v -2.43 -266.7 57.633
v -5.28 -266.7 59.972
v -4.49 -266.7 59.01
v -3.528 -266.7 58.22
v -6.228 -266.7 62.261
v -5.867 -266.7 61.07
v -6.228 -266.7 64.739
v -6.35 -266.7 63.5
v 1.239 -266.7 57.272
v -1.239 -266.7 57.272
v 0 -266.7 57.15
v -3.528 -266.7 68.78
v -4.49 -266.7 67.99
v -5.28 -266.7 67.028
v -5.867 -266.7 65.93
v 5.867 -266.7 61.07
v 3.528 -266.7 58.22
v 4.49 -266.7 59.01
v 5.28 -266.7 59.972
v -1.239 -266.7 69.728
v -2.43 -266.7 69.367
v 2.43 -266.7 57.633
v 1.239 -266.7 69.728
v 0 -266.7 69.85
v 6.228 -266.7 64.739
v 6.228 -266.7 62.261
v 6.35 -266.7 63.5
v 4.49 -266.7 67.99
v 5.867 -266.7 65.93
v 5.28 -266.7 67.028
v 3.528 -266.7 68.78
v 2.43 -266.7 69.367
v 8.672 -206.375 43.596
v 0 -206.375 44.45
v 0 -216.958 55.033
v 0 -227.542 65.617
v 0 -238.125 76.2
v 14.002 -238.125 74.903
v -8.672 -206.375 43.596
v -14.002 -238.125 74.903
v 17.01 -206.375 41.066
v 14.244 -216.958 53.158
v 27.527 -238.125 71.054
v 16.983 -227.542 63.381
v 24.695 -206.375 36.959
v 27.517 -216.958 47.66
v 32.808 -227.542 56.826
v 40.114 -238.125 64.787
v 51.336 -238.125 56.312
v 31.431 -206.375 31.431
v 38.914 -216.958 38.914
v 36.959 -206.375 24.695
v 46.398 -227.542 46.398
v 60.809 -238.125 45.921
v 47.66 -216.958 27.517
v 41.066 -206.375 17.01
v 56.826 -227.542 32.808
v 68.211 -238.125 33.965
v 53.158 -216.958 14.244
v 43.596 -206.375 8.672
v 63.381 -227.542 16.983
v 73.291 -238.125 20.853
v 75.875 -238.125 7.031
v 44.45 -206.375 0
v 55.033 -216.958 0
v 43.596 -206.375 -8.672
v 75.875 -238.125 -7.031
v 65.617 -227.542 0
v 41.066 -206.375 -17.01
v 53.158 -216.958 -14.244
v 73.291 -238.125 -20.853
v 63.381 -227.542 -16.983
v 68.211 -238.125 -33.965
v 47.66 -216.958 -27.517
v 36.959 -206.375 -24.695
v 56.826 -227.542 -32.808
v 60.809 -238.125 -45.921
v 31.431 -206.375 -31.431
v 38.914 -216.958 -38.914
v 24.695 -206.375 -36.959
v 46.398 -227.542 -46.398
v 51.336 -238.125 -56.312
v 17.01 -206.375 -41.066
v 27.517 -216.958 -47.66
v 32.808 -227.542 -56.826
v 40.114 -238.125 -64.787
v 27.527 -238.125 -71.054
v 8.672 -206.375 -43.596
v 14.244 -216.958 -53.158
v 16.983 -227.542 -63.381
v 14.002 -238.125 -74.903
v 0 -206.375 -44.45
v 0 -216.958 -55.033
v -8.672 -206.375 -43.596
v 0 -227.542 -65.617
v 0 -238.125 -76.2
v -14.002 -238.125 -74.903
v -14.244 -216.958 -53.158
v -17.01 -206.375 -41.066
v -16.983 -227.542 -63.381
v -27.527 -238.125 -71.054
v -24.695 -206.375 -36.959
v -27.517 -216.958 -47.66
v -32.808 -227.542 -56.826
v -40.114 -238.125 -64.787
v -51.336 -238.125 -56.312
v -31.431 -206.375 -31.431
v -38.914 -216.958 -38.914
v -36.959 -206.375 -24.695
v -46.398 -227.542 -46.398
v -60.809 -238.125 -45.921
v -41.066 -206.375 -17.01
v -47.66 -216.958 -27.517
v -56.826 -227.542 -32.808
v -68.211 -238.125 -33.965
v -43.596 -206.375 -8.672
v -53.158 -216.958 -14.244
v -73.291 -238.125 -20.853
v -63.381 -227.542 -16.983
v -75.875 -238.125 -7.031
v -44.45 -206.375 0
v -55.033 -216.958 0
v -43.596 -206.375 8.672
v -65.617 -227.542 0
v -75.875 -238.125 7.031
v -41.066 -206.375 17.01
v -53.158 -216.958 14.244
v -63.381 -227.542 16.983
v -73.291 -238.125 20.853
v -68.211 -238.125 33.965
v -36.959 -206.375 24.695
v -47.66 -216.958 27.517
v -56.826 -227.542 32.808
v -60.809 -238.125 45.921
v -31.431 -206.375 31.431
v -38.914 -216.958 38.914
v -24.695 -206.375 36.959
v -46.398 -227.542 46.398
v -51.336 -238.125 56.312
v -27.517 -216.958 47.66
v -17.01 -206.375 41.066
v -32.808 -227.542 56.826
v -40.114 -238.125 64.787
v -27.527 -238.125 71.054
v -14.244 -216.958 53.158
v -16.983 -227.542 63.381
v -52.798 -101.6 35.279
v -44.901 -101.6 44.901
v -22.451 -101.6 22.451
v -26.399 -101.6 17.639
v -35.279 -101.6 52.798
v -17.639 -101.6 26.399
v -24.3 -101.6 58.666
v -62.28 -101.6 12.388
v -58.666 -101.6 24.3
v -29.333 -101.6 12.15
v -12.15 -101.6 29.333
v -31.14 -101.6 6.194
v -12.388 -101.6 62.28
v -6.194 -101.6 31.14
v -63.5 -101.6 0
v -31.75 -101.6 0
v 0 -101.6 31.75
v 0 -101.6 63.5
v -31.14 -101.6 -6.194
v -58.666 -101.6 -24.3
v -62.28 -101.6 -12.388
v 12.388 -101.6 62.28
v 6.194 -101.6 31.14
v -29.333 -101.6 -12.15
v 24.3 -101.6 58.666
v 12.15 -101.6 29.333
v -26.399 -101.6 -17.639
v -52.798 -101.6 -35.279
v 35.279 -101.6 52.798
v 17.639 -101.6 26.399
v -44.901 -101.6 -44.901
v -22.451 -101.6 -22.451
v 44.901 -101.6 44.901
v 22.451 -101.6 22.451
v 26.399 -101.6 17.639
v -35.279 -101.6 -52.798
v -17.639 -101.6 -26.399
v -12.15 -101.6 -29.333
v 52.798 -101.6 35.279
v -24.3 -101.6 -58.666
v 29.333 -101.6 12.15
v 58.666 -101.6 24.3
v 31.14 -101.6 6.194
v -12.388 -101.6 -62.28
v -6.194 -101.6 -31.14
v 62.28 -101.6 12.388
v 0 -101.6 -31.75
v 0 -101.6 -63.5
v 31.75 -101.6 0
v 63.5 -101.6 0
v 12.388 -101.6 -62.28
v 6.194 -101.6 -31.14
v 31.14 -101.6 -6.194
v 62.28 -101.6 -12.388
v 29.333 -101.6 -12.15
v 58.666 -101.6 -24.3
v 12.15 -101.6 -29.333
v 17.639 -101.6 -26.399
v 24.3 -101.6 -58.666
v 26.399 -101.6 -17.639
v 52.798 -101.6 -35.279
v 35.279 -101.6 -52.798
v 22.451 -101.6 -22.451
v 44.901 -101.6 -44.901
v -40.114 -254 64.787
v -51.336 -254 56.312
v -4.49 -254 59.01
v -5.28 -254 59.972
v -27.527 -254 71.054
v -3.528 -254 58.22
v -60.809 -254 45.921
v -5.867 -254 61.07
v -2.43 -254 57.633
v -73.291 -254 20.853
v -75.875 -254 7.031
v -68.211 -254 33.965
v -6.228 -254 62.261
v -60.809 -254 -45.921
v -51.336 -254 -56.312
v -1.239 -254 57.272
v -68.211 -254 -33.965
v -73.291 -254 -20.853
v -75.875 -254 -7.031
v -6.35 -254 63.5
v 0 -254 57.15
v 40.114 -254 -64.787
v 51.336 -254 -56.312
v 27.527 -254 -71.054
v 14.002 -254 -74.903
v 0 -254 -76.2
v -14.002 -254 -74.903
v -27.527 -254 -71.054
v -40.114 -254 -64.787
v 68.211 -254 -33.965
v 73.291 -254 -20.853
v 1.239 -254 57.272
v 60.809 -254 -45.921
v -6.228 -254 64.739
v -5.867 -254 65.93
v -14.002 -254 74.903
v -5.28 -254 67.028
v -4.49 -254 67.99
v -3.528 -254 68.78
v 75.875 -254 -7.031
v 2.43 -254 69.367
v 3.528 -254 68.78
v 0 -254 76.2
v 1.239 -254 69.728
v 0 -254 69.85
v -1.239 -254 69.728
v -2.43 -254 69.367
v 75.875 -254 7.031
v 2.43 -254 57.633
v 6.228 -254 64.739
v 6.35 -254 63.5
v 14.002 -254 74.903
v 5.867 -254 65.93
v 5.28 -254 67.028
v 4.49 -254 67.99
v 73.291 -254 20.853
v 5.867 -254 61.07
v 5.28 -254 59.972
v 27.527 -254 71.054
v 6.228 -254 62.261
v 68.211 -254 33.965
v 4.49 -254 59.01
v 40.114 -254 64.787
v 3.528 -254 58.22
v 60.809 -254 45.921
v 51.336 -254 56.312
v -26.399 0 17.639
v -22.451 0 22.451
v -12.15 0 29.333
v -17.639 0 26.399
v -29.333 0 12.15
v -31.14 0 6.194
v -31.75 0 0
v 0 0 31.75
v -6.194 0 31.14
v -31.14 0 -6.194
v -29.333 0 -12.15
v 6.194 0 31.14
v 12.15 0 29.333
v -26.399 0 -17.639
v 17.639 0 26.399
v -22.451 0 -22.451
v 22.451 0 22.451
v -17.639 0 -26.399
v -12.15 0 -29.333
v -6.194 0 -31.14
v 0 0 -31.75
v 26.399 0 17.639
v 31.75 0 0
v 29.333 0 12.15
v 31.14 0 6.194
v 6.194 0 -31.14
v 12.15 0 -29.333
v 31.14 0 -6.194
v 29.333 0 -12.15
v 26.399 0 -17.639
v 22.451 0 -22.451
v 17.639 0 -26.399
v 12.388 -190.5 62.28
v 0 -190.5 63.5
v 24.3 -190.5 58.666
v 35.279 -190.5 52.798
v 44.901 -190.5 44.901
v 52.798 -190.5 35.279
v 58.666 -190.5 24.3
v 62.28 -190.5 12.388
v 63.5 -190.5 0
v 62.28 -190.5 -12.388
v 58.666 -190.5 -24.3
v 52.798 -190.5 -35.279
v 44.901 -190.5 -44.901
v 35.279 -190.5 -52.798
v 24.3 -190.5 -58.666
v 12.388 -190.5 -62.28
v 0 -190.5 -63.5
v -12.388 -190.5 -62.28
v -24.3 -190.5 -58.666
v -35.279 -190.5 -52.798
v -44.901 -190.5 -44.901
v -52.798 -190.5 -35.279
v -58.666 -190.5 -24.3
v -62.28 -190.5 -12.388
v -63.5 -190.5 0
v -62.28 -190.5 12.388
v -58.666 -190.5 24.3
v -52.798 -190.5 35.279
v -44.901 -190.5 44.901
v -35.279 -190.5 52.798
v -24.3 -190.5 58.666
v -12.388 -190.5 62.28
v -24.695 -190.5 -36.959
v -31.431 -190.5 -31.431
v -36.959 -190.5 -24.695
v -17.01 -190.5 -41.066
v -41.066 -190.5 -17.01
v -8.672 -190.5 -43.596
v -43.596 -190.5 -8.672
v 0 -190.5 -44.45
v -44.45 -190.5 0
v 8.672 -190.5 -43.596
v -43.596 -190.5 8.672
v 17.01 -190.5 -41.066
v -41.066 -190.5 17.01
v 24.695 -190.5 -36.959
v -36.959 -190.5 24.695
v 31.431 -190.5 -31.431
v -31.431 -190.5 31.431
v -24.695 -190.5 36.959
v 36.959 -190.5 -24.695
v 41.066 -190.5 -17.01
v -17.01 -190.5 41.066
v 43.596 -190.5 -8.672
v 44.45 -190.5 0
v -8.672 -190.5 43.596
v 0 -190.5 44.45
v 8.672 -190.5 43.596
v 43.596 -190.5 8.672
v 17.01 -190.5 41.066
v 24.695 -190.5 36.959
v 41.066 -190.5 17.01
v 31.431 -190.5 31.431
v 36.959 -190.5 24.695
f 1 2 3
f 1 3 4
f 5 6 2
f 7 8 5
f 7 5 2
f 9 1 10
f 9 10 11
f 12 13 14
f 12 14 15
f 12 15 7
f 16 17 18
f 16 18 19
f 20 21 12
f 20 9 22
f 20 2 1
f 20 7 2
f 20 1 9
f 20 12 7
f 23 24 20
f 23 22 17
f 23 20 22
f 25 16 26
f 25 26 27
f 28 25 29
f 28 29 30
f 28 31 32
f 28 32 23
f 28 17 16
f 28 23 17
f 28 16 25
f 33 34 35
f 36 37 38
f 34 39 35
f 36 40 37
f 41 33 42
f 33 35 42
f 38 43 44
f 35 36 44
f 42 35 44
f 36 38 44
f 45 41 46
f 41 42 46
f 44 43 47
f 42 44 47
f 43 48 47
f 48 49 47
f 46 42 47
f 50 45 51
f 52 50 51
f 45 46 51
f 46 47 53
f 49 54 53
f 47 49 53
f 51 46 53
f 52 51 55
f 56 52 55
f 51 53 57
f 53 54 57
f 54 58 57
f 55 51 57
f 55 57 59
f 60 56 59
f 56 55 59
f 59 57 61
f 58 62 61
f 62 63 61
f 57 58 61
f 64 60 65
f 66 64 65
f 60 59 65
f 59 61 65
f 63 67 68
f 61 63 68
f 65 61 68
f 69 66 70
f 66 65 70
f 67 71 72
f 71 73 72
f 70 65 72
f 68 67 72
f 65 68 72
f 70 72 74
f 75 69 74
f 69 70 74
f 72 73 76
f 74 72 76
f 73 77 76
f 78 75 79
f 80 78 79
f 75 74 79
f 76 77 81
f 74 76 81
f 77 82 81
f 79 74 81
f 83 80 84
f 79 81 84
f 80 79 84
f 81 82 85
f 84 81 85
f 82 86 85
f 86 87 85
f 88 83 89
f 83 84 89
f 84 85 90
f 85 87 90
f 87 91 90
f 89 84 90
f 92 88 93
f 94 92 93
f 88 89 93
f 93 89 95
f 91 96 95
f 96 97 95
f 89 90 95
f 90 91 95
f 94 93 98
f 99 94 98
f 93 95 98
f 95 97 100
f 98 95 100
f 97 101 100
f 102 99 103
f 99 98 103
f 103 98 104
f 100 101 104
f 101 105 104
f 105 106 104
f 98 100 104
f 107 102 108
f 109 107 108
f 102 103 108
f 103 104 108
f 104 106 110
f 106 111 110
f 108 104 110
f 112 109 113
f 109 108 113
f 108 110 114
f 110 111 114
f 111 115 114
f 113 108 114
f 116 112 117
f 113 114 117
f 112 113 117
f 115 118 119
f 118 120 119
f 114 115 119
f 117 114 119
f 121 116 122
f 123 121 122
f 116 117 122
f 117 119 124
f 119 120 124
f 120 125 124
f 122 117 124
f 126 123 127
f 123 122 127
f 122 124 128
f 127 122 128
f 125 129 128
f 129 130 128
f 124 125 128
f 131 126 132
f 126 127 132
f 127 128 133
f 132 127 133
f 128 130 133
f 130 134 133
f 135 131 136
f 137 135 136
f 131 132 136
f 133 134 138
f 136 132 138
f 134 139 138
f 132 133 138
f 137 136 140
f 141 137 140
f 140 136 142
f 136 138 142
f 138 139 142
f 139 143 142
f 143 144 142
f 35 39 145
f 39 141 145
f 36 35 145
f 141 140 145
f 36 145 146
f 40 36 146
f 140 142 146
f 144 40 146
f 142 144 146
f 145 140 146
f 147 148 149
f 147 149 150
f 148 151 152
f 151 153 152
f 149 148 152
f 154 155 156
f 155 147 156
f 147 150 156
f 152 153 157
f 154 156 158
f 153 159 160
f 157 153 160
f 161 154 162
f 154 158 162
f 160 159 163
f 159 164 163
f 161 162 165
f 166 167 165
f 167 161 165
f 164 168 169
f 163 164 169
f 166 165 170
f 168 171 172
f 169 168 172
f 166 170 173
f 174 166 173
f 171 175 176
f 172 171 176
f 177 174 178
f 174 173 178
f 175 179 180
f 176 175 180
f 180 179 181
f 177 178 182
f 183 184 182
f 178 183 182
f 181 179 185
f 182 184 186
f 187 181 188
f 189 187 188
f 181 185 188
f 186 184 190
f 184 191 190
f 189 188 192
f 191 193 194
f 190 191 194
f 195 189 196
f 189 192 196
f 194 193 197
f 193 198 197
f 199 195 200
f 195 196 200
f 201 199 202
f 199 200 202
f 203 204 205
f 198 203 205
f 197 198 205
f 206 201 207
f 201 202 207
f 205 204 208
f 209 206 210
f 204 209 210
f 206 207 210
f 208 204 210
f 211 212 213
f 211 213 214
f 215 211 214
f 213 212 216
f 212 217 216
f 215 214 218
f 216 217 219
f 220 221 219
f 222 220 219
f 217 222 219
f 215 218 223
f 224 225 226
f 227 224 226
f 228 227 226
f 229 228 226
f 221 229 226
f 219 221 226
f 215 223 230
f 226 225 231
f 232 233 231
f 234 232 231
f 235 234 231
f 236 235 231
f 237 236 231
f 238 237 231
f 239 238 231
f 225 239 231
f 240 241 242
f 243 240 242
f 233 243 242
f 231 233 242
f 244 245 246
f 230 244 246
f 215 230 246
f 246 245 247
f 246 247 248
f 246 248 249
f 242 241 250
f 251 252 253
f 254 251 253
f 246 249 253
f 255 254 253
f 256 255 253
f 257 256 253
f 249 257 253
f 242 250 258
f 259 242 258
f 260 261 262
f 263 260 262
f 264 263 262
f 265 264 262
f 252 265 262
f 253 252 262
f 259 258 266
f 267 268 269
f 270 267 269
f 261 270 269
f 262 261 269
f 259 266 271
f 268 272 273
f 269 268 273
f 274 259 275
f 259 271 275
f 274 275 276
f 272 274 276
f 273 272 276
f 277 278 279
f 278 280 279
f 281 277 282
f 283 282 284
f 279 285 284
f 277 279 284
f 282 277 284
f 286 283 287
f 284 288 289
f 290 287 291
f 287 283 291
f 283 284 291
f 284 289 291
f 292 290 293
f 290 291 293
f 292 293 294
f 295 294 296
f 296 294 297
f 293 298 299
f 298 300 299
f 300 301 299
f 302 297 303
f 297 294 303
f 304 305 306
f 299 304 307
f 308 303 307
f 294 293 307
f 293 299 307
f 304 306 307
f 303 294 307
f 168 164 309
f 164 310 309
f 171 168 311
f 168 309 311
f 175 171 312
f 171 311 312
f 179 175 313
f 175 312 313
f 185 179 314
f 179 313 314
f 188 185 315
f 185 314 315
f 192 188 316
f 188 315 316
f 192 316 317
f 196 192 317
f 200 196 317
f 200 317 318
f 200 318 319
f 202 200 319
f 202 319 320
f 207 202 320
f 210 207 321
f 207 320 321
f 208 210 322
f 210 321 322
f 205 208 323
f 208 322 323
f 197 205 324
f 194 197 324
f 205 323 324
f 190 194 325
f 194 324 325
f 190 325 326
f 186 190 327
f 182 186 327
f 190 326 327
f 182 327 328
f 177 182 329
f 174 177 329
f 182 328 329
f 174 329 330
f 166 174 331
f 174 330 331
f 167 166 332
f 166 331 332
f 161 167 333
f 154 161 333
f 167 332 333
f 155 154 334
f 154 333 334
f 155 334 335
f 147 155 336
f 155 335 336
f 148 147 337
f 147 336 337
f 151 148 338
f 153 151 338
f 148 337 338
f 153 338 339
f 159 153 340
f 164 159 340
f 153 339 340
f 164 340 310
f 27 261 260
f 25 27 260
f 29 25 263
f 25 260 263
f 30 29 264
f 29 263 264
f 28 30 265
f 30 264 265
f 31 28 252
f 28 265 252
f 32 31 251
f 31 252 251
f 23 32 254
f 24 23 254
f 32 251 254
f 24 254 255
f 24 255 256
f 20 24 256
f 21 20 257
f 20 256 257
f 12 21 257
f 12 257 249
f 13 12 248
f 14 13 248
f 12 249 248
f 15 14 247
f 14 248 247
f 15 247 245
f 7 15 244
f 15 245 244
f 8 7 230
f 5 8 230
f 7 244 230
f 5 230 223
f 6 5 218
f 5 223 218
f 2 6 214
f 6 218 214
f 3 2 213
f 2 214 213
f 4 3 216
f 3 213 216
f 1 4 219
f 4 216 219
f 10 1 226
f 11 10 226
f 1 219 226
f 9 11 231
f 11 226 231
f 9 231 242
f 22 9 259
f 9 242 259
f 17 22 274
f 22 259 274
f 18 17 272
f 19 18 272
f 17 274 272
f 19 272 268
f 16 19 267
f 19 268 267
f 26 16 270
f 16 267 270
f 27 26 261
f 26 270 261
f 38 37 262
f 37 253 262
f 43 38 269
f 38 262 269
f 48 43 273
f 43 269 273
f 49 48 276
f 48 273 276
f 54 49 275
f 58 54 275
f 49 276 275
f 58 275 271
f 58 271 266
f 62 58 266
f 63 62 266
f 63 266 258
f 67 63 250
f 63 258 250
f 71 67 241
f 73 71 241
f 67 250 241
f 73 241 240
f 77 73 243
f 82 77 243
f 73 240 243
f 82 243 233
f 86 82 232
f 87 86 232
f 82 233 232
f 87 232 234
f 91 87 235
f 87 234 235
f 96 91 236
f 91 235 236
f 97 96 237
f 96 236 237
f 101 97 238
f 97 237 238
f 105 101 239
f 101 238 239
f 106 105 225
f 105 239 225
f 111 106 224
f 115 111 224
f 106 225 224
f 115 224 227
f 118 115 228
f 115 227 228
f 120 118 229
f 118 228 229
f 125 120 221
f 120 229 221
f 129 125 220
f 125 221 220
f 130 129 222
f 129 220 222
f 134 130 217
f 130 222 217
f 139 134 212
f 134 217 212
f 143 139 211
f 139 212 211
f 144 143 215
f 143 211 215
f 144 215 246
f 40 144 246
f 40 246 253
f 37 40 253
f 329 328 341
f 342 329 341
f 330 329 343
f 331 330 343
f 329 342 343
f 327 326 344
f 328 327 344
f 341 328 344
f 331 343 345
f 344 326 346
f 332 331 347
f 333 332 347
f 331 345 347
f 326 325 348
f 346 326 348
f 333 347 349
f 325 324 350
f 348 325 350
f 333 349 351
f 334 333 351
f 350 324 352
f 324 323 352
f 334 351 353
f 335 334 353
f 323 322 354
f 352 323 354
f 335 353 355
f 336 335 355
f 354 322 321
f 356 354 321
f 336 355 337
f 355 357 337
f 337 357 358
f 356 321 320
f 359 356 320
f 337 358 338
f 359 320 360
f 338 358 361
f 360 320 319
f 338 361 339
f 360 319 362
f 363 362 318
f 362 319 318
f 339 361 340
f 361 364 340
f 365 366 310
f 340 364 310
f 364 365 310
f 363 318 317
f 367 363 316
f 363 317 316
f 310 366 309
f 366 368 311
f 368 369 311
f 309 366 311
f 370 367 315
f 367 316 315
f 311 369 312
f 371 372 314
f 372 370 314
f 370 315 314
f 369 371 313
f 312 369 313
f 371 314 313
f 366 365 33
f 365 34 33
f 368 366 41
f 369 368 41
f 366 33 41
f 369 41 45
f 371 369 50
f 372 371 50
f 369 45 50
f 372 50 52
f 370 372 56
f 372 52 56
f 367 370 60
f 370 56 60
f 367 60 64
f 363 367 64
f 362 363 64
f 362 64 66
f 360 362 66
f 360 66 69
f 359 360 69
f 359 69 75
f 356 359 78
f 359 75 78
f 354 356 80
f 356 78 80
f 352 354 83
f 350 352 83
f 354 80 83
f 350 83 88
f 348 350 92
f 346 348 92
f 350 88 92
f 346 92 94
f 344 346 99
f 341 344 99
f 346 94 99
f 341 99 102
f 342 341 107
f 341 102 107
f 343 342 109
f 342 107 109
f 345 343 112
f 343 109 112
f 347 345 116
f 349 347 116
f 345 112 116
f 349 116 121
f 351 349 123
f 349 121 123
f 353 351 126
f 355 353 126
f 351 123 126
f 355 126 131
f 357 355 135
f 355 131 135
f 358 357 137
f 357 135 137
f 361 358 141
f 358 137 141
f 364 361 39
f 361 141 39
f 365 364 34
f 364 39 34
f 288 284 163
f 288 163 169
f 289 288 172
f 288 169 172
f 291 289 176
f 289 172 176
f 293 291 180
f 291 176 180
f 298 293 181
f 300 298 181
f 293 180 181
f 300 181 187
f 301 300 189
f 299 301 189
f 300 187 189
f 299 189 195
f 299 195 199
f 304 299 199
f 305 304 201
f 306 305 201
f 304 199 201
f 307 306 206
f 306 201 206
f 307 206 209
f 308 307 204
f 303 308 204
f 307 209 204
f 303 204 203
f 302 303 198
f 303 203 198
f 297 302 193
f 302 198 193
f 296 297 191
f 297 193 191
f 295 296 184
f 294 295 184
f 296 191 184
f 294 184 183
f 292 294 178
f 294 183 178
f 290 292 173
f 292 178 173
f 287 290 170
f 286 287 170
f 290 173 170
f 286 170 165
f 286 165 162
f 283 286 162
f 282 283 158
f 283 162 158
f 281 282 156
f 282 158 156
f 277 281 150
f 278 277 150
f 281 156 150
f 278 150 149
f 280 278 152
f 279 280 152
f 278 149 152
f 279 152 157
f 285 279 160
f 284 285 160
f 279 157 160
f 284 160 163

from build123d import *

# Parameters (mm, degrees)
F2_R     = 6.35
F3_DEPTH = 12.7


with BuildPart() as f1:
    # F0 (on Right) → F1 (revolve)
    with BuildSketch(Plane.YZ):
        Polygon((-254, 0), (0, 0), (0, 31.75), (-101.6, 31.75), (-101.6, 63.5), (-190.5, 63.5), (-190.5, 44.45), (-206.375, 44.45), (-238.125, 76.2), (-254, 76.2), align=None)
    revolve(axis=Axis((0, -127, 0), (0, 1, 0)))

    # F2 (on face) → F3 (join)
    with BuildSketch(Plane.XZ.offset(254)):
        with Locations((0, 63.5)):
            Circle(F2_R)
    extrude(amount=F3_DEPTH)


solid = f1.part
